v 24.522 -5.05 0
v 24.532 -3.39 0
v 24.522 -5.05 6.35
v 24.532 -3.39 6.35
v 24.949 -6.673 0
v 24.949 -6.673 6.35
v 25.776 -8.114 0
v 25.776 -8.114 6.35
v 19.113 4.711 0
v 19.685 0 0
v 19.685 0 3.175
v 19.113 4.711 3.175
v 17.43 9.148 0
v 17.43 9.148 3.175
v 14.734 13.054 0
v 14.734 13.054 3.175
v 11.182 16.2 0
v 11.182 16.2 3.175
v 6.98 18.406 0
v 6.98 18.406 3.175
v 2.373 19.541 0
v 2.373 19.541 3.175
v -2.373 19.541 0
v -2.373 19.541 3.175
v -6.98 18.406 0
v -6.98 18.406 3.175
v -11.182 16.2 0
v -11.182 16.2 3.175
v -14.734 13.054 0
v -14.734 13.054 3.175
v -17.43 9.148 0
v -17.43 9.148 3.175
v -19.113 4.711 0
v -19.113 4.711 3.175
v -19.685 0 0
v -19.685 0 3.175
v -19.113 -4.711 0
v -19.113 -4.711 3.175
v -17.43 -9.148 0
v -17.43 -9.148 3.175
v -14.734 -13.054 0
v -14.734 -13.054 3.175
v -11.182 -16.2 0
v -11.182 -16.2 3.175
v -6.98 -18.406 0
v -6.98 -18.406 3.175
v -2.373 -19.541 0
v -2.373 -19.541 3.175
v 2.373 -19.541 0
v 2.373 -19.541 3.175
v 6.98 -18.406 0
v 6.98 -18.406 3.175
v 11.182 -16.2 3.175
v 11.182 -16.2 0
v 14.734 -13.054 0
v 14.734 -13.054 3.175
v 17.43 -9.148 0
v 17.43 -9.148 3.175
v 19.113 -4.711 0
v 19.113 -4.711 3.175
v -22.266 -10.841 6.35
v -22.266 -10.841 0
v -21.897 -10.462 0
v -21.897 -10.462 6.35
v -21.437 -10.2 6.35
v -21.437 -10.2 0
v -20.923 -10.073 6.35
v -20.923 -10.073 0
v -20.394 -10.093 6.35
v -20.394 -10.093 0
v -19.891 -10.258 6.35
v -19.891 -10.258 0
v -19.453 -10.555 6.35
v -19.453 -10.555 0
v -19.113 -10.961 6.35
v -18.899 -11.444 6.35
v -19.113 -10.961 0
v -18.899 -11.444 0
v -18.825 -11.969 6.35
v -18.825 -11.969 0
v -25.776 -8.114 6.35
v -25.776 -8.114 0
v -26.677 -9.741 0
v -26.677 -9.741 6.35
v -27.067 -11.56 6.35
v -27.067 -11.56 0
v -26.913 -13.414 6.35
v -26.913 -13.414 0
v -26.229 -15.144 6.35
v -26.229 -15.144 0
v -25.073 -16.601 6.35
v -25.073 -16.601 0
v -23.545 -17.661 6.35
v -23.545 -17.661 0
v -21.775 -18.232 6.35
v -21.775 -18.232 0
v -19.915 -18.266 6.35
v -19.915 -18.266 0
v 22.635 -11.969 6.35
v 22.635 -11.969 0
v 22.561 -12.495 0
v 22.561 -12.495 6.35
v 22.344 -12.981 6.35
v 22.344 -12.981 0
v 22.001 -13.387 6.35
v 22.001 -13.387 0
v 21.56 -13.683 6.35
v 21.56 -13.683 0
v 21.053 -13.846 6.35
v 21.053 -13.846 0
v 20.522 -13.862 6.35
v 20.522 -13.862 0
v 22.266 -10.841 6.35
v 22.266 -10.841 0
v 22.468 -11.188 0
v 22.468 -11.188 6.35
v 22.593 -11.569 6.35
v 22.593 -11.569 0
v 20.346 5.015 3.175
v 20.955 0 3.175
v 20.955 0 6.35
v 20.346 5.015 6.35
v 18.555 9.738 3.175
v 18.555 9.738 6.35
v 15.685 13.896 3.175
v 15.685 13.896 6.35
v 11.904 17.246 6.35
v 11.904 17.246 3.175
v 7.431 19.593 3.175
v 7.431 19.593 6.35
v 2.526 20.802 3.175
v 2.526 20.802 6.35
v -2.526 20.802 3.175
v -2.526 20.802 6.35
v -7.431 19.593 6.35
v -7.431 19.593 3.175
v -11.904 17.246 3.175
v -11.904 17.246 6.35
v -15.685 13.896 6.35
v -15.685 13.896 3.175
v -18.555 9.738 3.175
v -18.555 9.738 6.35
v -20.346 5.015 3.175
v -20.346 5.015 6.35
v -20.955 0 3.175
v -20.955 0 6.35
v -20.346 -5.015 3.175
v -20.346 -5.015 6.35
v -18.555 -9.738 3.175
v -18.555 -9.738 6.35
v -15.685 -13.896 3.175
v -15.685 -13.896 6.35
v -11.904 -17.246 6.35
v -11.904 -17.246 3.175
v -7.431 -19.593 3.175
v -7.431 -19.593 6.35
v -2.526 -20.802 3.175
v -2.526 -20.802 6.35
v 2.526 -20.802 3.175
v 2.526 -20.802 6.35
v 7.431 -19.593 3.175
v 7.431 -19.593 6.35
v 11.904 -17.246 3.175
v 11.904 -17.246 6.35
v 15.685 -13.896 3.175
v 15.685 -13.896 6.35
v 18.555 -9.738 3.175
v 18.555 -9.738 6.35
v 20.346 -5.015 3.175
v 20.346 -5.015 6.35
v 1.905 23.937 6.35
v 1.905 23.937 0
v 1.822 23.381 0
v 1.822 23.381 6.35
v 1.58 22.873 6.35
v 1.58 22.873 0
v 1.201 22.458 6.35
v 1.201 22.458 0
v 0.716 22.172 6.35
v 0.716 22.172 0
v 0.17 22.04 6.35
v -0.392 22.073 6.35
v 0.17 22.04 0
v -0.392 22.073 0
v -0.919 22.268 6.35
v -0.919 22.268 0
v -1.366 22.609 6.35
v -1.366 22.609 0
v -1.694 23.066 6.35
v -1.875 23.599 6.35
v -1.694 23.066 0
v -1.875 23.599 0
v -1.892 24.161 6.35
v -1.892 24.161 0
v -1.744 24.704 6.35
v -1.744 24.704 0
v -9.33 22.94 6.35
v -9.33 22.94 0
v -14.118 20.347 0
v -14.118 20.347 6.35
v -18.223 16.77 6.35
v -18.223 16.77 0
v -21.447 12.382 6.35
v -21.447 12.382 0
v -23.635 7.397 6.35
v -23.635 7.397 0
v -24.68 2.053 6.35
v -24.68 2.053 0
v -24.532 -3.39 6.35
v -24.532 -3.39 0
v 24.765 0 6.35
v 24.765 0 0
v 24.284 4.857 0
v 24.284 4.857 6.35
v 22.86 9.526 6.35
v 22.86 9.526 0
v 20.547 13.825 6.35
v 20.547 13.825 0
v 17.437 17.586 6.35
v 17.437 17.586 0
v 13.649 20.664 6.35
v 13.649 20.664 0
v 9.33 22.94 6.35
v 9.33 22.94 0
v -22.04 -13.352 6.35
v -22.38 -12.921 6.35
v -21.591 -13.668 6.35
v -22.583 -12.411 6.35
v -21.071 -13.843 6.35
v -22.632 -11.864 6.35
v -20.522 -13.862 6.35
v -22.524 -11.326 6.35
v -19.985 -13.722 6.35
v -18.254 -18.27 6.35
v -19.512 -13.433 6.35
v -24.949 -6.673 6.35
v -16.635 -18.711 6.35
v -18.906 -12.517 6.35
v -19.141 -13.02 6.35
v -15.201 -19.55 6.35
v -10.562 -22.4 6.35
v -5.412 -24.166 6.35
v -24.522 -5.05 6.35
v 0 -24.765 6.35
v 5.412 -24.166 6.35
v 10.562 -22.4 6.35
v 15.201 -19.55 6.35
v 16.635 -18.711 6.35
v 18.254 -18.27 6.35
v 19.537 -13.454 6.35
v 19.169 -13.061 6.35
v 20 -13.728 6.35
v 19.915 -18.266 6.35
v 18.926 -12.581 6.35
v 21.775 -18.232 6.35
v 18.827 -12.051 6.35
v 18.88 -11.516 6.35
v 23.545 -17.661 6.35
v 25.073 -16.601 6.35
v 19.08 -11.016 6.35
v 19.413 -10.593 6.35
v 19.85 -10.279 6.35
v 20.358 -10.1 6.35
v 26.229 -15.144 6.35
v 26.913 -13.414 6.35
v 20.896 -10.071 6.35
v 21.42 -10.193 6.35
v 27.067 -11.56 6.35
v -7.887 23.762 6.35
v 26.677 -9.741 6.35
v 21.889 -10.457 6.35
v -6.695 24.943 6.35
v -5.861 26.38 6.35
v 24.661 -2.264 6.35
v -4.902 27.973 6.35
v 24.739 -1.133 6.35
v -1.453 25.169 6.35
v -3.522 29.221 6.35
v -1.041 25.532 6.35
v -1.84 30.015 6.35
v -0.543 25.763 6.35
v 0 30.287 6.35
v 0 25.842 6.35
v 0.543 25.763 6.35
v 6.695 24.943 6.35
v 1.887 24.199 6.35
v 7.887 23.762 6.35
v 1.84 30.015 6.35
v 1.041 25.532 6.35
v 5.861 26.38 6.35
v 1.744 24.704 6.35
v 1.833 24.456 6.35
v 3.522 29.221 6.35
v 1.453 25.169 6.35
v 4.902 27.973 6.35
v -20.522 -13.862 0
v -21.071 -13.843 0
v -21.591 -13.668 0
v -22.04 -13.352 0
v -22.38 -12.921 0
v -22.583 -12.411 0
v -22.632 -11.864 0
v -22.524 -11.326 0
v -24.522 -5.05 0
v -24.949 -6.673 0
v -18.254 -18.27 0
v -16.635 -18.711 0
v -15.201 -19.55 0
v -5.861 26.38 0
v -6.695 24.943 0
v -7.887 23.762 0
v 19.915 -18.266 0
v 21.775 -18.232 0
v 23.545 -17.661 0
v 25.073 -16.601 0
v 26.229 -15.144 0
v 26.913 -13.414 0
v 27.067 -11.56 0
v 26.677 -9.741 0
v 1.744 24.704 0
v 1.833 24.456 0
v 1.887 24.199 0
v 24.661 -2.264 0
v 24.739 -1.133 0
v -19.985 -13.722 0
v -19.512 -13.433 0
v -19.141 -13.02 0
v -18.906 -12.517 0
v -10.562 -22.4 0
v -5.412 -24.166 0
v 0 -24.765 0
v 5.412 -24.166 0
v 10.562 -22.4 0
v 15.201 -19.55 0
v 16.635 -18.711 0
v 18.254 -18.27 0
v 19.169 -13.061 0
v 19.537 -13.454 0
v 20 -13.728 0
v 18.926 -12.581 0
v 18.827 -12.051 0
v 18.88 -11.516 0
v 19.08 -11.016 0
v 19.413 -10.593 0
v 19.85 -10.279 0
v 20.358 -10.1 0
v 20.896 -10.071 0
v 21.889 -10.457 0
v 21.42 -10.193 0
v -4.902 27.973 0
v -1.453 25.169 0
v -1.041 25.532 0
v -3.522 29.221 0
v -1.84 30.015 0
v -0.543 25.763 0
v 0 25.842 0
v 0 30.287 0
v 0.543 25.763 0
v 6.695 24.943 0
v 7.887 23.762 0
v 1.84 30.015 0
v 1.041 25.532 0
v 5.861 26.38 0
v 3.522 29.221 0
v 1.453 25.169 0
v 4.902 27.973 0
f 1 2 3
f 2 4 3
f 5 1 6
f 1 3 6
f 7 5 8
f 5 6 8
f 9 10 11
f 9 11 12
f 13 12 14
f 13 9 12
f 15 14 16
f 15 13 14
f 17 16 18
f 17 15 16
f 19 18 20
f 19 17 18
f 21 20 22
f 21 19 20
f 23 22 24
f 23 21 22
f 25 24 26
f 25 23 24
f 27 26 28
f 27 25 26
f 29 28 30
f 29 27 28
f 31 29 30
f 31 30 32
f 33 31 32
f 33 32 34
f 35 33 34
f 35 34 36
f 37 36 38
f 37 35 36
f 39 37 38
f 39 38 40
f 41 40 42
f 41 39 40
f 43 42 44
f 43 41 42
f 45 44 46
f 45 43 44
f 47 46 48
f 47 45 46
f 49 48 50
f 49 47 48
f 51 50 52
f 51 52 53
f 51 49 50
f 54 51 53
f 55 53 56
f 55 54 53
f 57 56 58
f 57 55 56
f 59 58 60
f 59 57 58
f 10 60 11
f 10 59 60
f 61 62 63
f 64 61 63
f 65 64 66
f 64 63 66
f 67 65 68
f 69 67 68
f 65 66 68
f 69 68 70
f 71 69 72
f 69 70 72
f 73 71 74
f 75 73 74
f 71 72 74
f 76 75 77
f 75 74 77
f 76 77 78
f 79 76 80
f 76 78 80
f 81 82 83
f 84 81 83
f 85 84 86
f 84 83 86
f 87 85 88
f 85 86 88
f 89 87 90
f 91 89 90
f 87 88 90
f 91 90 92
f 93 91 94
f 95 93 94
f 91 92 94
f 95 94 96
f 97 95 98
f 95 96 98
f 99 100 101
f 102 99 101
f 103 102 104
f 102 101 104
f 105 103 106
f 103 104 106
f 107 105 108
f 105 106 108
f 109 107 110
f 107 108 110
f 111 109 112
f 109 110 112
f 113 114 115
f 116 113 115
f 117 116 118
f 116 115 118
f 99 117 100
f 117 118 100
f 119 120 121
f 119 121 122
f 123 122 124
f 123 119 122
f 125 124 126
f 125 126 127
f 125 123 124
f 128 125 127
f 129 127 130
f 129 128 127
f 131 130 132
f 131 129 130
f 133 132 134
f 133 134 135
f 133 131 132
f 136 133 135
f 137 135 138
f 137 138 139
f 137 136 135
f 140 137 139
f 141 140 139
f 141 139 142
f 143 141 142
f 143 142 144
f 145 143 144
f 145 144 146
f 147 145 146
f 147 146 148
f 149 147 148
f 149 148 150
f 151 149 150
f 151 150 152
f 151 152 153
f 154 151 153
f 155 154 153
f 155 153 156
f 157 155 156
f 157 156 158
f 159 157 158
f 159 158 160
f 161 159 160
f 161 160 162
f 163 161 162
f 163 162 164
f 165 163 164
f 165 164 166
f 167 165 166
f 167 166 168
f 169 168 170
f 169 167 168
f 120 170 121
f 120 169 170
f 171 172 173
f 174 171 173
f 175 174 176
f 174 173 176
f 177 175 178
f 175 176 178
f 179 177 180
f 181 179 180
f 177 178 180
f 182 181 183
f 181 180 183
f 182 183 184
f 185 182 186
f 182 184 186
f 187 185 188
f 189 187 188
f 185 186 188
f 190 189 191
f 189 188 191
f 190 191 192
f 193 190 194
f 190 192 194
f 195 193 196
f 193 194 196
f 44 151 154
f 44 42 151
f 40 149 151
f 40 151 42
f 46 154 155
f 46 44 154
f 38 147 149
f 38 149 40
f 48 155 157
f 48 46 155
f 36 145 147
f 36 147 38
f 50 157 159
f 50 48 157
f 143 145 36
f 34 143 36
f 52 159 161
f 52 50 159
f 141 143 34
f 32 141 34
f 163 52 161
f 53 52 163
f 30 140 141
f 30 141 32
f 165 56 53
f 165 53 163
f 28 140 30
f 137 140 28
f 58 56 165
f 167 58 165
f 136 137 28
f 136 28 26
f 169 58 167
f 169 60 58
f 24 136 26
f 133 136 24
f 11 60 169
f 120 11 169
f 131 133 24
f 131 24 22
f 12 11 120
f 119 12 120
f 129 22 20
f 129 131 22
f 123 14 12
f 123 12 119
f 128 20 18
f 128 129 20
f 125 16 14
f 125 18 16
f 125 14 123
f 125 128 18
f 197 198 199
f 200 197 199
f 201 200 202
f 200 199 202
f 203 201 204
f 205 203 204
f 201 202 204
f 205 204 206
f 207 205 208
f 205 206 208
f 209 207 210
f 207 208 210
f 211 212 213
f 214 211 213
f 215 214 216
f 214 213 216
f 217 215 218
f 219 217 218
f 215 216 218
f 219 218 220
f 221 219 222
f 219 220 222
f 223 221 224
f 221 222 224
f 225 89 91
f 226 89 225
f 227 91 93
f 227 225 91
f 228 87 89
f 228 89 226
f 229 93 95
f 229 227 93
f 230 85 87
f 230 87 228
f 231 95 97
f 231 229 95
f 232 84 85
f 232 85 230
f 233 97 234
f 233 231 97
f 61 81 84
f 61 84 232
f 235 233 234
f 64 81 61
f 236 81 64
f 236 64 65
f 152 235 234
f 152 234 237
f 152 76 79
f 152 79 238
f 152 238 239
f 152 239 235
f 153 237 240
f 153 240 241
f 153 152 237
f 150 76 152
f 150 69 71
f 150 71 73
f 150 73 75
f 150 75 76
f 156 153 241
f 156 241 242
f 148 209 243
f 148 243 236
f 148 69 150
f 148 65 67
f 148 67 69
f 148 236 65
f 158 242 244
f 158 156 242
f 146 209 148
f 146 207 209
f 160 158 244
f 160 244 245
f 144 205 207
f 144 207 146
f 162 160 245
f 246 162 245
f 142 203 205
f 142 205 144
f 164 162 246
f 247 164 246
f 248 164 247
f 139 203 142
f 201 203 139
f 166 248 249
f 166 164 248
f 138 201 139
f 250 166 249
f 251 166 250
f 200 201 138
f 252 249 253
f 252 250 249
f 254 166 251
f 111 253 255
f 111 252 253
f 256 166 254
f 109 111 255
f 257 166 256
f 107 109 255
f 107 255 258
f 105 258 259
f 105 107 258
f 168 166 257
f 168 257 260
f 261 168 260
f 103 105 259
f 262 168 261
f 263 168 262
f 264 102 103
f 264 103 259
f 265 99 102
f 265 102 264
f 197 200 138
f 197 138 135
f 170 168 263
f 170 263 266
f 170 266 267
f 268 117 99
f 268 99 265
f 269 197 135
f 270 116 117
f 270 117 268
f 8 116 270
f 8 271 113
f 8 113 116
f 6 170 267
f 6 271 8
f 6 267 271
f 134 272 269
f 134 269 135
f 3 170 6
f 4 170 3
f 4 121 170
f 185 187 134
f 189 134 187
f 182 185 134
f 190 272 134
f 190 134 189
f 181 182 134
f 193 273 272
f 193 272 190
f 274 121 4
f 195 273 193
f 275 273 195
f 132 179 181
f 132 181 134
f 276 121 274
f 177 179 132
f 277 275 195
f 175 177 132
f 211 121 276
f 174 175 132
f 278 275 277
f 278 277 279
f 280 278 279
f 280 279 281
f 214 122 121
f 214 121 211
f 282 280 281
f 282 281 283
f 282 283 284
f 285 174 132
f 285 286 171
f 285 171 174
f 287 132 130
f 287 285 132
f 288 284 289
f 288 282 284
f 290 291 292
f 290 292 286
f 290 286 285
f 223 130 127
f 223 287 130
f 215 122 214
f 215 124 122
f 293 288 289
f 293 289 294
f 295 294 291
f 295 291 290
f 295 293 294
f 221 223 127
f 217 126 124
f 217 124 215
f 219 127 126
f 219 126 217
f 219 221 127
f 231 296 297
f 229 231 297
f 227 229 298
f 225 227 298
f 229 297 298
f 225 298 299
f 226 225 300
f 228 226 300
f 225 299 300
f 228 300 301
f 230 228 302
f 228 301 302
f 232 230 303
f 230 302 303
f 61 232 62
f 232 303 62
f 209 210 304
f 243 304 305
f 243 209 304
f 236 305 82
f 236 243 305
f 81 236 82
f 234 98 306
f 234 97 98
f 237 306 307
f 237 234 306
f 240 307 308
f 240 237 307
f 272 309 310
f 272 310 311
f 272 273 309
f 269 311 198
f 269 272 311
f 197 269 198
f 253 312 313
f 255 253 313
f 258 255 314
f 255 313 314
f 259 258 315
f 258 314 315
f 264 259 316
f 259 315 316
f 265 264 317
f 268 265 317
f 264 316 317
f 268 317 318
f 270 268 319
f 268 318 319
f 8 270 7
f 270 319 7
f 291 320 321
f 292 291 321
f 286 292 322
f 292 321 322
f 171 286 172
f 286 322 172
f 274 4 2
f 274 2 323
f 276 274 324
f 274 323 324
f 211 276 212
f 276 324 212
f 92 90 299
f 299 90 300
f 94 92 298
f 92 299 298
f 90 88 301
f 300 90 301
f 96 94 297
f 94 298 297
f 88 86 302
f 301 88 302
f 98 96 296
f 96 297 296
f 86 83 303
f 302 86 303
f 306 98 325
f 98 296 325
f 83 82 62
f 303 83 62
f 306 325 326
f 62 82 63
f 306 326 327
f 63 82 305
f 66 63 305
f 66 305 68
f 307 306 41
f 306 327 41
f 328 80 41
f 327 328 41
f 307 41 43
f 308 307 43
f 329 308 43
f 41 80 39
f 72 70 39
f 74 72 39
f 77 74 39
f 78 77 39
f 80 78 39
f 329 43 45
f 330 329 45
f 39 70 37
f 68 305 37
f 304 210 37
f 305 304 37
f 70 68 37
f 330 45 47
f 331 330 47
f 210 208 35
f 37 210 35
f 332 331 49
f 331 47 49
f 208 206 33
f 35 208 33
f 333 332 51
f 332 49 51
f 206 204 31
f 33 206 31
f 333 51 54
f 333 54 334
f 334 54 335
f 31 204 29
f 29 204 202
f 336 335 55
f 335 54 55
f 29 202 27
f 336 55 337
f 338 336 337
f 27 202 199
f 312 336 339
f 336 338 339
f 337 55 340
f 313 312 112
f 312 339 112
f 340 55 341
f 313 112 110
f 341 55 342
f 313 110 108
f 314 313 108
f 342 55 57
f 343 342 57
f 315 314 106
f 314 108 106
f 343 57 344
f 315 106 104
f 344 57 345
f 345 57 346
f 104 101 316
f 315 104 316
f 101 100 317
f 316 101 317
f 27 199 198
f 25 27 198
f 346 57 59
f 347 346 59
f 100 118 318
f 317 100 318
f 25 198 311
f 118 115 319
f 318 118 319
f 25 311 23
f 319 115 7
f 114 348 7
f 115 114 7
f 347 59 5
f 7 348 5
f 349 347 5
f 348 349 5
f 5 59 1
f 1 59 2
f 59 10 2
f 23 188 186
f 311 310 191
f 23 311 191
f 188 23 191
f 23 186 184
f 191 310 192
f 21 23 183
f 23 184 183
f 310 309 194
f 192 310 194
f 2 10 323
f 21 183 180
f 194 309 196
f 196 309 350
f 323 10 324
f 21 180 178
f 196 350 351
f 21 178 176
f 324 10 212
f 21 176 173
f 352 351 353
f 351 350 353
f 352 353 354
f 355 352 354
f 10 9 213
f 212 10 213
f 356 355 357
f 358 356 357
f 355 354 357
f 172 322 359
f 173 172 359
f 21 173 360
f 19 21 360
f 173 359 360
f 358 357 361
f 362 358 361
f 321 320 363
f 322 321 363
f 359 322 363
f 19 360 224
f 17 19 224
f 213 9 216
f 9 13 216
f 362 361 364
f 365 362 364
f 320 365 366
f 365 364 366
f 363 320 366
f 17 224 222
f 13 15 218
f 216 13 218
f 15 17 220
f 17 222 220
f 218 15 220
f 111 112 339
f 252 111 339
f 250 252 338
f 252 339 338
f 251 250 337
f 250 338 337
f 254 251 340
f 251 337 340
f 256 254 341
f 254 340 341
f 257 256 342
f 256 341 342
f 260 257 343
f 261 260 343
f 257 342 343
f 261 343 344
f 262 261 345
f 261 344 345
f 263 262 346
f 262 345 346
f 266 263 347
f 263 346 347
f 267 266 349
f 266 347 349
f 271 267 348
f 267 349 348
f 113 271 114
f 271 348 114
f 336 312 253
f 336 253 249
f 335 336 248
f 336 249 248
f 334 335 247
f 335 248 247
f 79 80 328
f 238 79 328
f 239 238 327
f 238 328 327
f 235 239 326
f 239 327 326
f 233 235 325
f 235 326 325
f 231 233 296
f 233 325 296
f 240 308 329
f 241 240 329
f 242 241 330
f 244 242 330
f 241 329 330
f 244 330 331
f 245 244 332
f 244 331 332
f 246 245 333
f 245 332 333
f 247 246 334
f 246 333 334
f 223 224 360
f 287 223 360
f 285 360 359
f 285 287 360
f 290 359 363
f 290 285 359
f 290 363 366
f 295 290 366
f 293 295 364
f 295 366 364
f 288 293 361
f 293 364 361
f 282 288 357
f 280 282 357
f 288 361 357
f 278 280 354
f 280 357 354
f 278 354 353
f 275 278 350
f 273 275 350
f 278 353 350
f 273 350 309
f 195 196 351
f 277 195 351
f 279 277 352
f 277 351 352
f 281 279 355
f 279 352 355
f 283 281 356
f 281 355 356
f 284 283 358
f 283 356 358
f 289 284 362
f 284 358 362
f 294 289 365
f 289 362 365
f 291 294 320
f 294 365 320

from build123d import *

# Parameters (mm, degrees)
F0_R     = 20.955
F0_R_2   = 19.685
F1_DEPTH = 3.175
F2_DEPTH = 6.35
F3_R     = 6.35


with BuildPart() as f1:
    # F0 (on Top) → F1 (new body)
    with BuildSketch(Plane.XY):
        Circle(F0_R)
        Circle(F0_R_2, mode=Mode.SUBTRACT)
    extrude(amount=F1_DEPTH)

    # F0 (on Top) → F2 (join)
    with BuildSketch(Plane.XY):
        with BuildLine():
            ThreePointArc((23.9050999455, -6.4692674698), (24.5490837421, -3.2630832697), (24.765, 0))
            ThreePointArc((24.765, 0), (19.6285885254, 15.1004548773), (6.35, 23.9370575677))
            ThreePointArc((6.35, 23.9370575677), (4.0651088886, 24.4290833787), (1.7440091422, 24.703515076))
            ThreePointArc((1.7440091422, 24.703515076), (1.8643178935, 24.3286489263), (1.905, 23.9370575677))
            ThreePointArc((1.905, 23.9370575677), (-0.3915913586, 22.0727396742), (-1.7440091422, 24.703515076))
            ThreePointArc((-1.7440091422, 24.703515076), (-4.0651088886, 24.4290833787), (-6.35, 23.9370575677))
            ThreePointArc((-6.35, 23.9370575677), (-21.4471191247, 12.3825), (-23.9050999455, -6.4692674698))
            ThreePointArc((-23.9050999455, -6.4692674698), (-23.1887612414, -8.6940541227), (-22.2658761897, -10.8414013165))
            ThreePointArc((-22.2658761897, -10.8414013165), (-20.1370690632, -10.1581864481), (-18.8250999455, -11.9685287839))
            ThreePointArc((-18.8250999455, -11.9685287839), (-19.3113489683, -13.239815795), (-20.5218670475, -13.8621137596))
            ThreePointArc((-20.5218670475, -13.8621137596), (-19.1236523528, -15.735029256), (-17.5550999455, -17.4677900979))
            ThreePointArc((-17.5550999455, -17.4677900979), (0, -24.765), (17.5550999455, -17.4677900979))
            ThreePointArc((17.5550999455, -17.4677900979), (19.1236523528, -15.735029256), (20.5218670475, -13.8621137596))
            ThreePointArc((20.5218670475, -13.8621137596), (19.0803215513, -11.0160287839), (22.2658761897, -10.8414013165))
            ThreePointArc((22.2658761897, -10.8414013165), (23.1887612414, -8.6940541227), (23.9050999455, -6.4692674698))
        make_face()
        Circle(F0_R, mode=Mode.SUBTRACT)
        with BuildLine():
            ThreePointArc((1.7440091422, 24.703515076), (4.0651088886, 24.4290833787), (6.35, 23.9370575677))
            ThreePointArc((6.35, 23.9370575677), (0, 30.2870575677), (-6.35, 23.9370575677))
            ThreePointArc((-6.35, 23.9370575677), (-4.0651088886, 24.4290833787), (-1.7440091422, 24.703515076))
            ThreePointArc((-1.7440091422, 24.703515076), (0, 25.8420575677), (1.7440091422, 24.703515076))
        make_face()
        with BuildLine():
            ThreePointArc((17.5550999455, -17.4677900979), (26.2293612595, -15.1435287839), (23.9050999455, -6.4692674698))
            ThreePointArc((23.9050999455, -6.4692674698), (23.1887612414, -8.6940541227), (22.2658761897, -10.8414013165))
            ThreePointArc((22.2658761897, -10.8414013165), (22.5404422812, -11.3754979015), (22.6350999455, -11.9685287839))
            ThreePointArc((22.6350999455, -11.9685287839), (22.0013869566, -13.3872797611), (20.5218670475, -13.8621137596))
            ThreePointArc((20.5218670475, -13.8621137596), (19.1236523528, -15.735029256), (17.5550999455, -17.4677900979))
        make_face()
        with BuildLine():
            ThreePointArc((-22.2658761897, -10.8414013165), (-23.1887612414, -8.6940541227), (-23.9050999455, -6.4692674698))
            ThreePointArc((-23.9050999455, -6.4692674698), (-26.2293612595, -15.1435287839), (-17.5550999455, -17.4677900979))
            ThreePointArc((-17.5550999455, -17.4677900979), (-19.1236523528, -15.735029256), (-20.5218670475, -13.8621137596))
            ThreePointArc((-20.5218670475, -13.8621137596), (-22.3798783397, -12.9210287839), (-22.2658761897, -10.8414013165))
        make_face()
    extrude(amount=F2_DEPTH)

    # F3
    f3_edges = [f1.edges().sort_by_distance(p)[0] for p in [
        (6.35, 23.937058, 3.175),
        (-23.9051, -6.469267, 3.175),
        (17.5551, -17.46779, 3.175),
        (23.9051, -6.469267, 3.175),
        (-6.35, 23.937058, 3.175),
        (-17.5551, -17.46779, 3.175),
    ]]
    fillet(f3_edges, radius=F3_R)


solid = f1.part
